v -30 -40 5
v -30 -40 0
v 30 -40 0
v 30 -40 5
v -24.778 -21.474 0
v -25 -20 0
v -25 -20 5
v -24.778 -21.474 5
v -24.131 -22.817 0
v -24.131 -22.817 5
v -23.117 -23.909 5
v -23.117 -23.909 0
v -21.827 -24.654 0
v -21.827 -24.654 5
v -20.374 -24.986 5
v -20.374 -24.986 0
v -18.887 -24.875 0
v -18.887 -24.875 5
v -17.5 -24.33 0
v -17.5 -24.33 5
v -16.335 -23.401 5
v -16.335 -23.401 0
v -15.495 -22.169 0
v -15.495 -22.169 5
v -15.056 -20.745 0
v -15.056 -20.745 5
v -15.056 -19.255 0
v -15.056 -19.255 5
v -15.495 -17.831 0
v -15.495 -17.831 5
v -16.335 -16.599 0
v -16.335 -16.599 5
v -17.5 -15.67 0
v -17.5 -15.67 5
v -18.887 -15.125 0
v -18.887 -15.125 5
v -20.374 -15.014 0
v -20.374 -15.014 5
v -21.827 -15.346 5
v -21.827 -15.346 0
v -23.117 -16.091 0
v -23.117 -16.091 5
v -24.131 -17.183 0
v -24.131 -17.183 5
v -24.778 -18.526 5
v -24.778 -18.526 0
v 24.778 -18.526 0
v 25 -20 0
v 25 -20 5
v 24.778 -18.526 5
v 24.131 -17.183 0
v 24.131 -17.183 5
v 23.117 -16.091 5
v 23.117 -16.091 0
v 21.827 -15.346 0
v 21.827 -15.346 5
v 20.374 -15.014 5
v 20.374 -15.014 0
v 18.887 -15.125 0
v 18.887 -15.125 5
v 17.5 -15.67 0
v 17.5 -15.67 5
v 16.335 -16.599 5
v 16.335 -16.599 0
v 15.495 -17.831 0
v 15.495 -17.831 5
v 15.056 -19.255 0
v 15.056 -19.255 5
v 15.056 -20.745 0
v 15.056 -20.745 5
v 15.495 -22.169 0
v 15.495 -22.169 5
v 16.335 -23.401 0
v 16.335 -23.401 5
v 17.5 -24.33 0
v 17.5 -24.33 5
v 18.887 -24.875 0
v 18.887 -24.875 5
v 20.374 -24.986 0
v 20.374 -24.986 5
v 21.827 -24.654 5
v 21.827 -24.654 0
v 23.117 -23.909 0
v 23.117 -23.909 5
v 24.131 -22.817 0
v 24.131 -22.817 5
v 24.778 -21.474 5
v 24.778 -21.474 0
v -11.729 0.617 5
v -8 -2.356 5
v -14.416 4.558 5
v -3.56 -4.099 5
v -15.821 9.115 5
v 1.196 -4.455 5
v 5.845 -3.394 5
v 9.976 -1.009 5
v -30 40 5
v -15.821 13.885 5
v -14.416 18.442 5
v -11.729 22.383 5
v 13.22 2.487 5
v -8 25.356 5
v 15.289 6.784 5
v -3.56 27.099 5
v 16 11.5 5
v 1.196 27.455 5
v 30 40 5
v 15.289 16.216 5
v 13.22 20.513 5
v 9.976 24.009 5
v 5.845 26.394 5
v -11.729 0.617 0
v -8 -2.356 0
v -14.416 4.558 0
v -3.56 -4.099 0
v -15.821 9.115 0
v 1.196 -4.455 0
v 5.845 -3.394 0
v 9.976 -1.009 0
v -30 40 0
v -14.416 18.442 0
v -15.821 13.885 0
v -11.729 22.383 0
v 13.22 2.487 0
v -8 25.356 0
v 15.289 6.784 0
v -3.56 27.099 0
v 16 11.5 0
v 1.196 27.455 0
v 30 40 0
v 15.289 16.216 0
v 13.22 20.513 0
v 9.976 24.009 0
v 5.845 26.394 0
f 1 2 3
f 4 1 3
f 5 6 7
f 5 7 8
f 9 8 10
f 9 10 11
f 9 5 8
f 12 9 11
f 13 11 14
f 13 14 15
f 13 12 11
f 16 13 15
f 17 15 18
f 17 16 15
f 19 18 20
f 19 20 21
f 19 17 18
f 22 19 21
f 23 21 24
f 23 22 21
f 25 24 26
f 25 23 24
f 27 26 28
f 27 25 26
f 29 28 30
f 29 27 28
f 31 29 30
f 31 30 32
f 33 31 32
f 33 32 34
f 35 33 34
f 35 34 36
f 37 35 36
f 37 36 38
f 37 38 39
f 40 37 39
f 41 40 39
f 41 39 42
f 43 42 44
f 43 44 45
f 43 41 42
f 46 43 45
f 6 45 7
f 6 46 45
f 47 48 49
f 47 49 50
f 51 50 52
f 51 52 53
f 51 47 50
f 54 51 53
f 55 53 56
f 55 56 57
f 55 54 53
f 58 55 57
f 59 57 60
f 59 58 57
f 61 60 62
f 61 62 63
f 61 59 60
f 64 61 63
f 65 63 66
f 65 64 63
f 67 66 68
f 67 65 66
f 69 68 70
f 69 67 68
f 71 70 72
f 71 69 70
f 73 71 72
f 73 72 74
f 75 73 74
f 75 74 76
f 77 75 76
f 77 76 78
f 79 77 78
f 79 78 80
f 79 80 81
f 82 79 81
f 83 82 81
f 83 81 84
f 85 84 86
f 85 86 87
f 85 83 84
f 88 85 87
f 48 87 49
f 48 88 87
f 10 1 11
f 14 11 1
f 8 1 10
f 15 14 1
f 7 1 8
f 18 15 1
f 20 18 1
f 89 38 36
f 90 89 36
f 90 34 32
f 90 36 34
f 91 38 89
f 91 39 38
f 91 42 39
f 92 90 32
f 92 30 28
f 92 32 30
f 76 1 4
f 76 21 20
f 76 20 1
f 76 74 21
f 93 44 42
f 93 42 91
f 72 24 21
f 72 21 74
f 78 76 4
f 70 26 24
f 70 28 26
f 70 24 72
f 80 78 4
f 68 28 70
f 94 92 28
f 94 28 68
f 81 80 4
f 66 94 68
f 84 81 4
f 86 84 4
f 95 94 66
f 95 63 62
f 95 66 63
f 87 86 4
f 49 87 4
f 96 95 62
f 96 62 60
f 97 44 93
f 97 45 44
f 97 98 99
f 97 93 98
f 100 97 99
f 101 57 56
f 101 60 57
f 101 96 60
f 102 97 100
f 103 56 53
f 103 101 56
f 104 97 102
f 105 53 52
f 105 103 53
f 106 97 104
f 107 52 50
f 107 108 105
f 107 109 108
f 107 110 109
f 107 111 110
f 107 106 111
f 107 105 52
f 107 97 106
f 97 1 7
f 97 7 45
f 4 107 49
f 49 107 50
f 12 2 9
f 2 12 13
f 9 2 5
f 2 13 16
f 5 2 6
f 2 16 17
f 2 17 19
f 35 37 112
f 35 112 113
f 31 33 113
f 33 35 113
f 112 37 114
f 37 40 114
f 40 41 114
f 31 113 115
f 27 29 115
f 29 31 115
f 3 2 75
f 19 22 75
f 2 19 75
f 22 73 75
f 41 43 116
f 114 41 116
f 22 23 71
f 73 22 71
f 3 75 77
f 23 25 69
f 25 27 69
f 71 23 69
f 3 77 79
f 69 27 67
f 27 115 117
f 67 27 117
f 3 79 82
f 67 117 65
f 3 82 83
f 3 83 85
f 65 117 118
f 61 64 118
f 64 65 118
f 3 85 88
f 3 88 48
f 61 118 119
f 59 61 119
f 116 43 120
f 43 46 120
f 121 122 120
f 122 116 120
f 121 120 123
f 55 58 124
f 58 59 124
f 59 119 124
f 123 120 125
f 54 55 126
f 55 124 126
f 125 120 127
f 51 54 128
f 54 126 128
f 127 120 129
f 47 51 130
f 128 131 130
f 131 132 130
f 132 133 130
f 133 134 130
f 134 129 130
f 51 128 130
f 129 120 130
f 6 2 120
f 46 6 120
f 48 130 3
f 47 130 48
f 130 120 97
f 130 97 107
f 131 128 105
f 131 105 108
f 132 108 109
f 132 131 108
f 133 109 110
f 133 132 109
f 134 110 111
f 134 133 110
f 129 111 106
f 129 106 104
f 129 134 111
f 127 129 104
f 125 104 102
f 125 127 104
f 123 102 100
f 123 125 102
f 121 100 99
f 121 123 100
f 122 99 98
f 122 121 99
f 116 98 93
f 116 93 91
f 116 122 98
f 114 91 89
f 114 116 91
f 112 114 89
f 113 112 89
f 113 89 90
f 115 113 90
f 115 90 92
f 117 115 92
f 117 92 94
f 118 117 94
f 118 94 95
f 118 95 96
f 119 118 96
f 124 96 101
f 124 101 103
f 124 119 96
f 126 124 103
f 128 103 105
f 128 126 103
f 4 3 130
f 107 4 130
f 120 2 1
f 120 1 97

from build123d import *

# Parameters (mm, degrees)
SKETCH1_W           = 60
SKETCH1_H           = 80
SKETCH1_R           = 16
SKETCH1_R_2         = 5
BOSS_EXTRUDE1_DEPTH = 5


with BuildPart() as part:
    # Sketch1 → Boss-Extrude1 (new body)
    with BuildSketch(Plane.XY):
        Rectangle(SKETCH1_W, SKETCH1_H)
        with Locations((0, 11.5)):
            Circle(SKETCH1_R, mode=Mode.SUBTRACT)
        with Locations((20, -20)):
            Circle(SKETCH1_R_2, mode=Mode.SUBTRACT)
        with Locations(Location((-20, -20, 0), (0, 0, 180))):
            Circle(SKETCH1_R_2, mode=Mode.SUBTRACT)
    extrude(amount=BOSS_EXTRUDE1_DEPTH)


solid = part.part
